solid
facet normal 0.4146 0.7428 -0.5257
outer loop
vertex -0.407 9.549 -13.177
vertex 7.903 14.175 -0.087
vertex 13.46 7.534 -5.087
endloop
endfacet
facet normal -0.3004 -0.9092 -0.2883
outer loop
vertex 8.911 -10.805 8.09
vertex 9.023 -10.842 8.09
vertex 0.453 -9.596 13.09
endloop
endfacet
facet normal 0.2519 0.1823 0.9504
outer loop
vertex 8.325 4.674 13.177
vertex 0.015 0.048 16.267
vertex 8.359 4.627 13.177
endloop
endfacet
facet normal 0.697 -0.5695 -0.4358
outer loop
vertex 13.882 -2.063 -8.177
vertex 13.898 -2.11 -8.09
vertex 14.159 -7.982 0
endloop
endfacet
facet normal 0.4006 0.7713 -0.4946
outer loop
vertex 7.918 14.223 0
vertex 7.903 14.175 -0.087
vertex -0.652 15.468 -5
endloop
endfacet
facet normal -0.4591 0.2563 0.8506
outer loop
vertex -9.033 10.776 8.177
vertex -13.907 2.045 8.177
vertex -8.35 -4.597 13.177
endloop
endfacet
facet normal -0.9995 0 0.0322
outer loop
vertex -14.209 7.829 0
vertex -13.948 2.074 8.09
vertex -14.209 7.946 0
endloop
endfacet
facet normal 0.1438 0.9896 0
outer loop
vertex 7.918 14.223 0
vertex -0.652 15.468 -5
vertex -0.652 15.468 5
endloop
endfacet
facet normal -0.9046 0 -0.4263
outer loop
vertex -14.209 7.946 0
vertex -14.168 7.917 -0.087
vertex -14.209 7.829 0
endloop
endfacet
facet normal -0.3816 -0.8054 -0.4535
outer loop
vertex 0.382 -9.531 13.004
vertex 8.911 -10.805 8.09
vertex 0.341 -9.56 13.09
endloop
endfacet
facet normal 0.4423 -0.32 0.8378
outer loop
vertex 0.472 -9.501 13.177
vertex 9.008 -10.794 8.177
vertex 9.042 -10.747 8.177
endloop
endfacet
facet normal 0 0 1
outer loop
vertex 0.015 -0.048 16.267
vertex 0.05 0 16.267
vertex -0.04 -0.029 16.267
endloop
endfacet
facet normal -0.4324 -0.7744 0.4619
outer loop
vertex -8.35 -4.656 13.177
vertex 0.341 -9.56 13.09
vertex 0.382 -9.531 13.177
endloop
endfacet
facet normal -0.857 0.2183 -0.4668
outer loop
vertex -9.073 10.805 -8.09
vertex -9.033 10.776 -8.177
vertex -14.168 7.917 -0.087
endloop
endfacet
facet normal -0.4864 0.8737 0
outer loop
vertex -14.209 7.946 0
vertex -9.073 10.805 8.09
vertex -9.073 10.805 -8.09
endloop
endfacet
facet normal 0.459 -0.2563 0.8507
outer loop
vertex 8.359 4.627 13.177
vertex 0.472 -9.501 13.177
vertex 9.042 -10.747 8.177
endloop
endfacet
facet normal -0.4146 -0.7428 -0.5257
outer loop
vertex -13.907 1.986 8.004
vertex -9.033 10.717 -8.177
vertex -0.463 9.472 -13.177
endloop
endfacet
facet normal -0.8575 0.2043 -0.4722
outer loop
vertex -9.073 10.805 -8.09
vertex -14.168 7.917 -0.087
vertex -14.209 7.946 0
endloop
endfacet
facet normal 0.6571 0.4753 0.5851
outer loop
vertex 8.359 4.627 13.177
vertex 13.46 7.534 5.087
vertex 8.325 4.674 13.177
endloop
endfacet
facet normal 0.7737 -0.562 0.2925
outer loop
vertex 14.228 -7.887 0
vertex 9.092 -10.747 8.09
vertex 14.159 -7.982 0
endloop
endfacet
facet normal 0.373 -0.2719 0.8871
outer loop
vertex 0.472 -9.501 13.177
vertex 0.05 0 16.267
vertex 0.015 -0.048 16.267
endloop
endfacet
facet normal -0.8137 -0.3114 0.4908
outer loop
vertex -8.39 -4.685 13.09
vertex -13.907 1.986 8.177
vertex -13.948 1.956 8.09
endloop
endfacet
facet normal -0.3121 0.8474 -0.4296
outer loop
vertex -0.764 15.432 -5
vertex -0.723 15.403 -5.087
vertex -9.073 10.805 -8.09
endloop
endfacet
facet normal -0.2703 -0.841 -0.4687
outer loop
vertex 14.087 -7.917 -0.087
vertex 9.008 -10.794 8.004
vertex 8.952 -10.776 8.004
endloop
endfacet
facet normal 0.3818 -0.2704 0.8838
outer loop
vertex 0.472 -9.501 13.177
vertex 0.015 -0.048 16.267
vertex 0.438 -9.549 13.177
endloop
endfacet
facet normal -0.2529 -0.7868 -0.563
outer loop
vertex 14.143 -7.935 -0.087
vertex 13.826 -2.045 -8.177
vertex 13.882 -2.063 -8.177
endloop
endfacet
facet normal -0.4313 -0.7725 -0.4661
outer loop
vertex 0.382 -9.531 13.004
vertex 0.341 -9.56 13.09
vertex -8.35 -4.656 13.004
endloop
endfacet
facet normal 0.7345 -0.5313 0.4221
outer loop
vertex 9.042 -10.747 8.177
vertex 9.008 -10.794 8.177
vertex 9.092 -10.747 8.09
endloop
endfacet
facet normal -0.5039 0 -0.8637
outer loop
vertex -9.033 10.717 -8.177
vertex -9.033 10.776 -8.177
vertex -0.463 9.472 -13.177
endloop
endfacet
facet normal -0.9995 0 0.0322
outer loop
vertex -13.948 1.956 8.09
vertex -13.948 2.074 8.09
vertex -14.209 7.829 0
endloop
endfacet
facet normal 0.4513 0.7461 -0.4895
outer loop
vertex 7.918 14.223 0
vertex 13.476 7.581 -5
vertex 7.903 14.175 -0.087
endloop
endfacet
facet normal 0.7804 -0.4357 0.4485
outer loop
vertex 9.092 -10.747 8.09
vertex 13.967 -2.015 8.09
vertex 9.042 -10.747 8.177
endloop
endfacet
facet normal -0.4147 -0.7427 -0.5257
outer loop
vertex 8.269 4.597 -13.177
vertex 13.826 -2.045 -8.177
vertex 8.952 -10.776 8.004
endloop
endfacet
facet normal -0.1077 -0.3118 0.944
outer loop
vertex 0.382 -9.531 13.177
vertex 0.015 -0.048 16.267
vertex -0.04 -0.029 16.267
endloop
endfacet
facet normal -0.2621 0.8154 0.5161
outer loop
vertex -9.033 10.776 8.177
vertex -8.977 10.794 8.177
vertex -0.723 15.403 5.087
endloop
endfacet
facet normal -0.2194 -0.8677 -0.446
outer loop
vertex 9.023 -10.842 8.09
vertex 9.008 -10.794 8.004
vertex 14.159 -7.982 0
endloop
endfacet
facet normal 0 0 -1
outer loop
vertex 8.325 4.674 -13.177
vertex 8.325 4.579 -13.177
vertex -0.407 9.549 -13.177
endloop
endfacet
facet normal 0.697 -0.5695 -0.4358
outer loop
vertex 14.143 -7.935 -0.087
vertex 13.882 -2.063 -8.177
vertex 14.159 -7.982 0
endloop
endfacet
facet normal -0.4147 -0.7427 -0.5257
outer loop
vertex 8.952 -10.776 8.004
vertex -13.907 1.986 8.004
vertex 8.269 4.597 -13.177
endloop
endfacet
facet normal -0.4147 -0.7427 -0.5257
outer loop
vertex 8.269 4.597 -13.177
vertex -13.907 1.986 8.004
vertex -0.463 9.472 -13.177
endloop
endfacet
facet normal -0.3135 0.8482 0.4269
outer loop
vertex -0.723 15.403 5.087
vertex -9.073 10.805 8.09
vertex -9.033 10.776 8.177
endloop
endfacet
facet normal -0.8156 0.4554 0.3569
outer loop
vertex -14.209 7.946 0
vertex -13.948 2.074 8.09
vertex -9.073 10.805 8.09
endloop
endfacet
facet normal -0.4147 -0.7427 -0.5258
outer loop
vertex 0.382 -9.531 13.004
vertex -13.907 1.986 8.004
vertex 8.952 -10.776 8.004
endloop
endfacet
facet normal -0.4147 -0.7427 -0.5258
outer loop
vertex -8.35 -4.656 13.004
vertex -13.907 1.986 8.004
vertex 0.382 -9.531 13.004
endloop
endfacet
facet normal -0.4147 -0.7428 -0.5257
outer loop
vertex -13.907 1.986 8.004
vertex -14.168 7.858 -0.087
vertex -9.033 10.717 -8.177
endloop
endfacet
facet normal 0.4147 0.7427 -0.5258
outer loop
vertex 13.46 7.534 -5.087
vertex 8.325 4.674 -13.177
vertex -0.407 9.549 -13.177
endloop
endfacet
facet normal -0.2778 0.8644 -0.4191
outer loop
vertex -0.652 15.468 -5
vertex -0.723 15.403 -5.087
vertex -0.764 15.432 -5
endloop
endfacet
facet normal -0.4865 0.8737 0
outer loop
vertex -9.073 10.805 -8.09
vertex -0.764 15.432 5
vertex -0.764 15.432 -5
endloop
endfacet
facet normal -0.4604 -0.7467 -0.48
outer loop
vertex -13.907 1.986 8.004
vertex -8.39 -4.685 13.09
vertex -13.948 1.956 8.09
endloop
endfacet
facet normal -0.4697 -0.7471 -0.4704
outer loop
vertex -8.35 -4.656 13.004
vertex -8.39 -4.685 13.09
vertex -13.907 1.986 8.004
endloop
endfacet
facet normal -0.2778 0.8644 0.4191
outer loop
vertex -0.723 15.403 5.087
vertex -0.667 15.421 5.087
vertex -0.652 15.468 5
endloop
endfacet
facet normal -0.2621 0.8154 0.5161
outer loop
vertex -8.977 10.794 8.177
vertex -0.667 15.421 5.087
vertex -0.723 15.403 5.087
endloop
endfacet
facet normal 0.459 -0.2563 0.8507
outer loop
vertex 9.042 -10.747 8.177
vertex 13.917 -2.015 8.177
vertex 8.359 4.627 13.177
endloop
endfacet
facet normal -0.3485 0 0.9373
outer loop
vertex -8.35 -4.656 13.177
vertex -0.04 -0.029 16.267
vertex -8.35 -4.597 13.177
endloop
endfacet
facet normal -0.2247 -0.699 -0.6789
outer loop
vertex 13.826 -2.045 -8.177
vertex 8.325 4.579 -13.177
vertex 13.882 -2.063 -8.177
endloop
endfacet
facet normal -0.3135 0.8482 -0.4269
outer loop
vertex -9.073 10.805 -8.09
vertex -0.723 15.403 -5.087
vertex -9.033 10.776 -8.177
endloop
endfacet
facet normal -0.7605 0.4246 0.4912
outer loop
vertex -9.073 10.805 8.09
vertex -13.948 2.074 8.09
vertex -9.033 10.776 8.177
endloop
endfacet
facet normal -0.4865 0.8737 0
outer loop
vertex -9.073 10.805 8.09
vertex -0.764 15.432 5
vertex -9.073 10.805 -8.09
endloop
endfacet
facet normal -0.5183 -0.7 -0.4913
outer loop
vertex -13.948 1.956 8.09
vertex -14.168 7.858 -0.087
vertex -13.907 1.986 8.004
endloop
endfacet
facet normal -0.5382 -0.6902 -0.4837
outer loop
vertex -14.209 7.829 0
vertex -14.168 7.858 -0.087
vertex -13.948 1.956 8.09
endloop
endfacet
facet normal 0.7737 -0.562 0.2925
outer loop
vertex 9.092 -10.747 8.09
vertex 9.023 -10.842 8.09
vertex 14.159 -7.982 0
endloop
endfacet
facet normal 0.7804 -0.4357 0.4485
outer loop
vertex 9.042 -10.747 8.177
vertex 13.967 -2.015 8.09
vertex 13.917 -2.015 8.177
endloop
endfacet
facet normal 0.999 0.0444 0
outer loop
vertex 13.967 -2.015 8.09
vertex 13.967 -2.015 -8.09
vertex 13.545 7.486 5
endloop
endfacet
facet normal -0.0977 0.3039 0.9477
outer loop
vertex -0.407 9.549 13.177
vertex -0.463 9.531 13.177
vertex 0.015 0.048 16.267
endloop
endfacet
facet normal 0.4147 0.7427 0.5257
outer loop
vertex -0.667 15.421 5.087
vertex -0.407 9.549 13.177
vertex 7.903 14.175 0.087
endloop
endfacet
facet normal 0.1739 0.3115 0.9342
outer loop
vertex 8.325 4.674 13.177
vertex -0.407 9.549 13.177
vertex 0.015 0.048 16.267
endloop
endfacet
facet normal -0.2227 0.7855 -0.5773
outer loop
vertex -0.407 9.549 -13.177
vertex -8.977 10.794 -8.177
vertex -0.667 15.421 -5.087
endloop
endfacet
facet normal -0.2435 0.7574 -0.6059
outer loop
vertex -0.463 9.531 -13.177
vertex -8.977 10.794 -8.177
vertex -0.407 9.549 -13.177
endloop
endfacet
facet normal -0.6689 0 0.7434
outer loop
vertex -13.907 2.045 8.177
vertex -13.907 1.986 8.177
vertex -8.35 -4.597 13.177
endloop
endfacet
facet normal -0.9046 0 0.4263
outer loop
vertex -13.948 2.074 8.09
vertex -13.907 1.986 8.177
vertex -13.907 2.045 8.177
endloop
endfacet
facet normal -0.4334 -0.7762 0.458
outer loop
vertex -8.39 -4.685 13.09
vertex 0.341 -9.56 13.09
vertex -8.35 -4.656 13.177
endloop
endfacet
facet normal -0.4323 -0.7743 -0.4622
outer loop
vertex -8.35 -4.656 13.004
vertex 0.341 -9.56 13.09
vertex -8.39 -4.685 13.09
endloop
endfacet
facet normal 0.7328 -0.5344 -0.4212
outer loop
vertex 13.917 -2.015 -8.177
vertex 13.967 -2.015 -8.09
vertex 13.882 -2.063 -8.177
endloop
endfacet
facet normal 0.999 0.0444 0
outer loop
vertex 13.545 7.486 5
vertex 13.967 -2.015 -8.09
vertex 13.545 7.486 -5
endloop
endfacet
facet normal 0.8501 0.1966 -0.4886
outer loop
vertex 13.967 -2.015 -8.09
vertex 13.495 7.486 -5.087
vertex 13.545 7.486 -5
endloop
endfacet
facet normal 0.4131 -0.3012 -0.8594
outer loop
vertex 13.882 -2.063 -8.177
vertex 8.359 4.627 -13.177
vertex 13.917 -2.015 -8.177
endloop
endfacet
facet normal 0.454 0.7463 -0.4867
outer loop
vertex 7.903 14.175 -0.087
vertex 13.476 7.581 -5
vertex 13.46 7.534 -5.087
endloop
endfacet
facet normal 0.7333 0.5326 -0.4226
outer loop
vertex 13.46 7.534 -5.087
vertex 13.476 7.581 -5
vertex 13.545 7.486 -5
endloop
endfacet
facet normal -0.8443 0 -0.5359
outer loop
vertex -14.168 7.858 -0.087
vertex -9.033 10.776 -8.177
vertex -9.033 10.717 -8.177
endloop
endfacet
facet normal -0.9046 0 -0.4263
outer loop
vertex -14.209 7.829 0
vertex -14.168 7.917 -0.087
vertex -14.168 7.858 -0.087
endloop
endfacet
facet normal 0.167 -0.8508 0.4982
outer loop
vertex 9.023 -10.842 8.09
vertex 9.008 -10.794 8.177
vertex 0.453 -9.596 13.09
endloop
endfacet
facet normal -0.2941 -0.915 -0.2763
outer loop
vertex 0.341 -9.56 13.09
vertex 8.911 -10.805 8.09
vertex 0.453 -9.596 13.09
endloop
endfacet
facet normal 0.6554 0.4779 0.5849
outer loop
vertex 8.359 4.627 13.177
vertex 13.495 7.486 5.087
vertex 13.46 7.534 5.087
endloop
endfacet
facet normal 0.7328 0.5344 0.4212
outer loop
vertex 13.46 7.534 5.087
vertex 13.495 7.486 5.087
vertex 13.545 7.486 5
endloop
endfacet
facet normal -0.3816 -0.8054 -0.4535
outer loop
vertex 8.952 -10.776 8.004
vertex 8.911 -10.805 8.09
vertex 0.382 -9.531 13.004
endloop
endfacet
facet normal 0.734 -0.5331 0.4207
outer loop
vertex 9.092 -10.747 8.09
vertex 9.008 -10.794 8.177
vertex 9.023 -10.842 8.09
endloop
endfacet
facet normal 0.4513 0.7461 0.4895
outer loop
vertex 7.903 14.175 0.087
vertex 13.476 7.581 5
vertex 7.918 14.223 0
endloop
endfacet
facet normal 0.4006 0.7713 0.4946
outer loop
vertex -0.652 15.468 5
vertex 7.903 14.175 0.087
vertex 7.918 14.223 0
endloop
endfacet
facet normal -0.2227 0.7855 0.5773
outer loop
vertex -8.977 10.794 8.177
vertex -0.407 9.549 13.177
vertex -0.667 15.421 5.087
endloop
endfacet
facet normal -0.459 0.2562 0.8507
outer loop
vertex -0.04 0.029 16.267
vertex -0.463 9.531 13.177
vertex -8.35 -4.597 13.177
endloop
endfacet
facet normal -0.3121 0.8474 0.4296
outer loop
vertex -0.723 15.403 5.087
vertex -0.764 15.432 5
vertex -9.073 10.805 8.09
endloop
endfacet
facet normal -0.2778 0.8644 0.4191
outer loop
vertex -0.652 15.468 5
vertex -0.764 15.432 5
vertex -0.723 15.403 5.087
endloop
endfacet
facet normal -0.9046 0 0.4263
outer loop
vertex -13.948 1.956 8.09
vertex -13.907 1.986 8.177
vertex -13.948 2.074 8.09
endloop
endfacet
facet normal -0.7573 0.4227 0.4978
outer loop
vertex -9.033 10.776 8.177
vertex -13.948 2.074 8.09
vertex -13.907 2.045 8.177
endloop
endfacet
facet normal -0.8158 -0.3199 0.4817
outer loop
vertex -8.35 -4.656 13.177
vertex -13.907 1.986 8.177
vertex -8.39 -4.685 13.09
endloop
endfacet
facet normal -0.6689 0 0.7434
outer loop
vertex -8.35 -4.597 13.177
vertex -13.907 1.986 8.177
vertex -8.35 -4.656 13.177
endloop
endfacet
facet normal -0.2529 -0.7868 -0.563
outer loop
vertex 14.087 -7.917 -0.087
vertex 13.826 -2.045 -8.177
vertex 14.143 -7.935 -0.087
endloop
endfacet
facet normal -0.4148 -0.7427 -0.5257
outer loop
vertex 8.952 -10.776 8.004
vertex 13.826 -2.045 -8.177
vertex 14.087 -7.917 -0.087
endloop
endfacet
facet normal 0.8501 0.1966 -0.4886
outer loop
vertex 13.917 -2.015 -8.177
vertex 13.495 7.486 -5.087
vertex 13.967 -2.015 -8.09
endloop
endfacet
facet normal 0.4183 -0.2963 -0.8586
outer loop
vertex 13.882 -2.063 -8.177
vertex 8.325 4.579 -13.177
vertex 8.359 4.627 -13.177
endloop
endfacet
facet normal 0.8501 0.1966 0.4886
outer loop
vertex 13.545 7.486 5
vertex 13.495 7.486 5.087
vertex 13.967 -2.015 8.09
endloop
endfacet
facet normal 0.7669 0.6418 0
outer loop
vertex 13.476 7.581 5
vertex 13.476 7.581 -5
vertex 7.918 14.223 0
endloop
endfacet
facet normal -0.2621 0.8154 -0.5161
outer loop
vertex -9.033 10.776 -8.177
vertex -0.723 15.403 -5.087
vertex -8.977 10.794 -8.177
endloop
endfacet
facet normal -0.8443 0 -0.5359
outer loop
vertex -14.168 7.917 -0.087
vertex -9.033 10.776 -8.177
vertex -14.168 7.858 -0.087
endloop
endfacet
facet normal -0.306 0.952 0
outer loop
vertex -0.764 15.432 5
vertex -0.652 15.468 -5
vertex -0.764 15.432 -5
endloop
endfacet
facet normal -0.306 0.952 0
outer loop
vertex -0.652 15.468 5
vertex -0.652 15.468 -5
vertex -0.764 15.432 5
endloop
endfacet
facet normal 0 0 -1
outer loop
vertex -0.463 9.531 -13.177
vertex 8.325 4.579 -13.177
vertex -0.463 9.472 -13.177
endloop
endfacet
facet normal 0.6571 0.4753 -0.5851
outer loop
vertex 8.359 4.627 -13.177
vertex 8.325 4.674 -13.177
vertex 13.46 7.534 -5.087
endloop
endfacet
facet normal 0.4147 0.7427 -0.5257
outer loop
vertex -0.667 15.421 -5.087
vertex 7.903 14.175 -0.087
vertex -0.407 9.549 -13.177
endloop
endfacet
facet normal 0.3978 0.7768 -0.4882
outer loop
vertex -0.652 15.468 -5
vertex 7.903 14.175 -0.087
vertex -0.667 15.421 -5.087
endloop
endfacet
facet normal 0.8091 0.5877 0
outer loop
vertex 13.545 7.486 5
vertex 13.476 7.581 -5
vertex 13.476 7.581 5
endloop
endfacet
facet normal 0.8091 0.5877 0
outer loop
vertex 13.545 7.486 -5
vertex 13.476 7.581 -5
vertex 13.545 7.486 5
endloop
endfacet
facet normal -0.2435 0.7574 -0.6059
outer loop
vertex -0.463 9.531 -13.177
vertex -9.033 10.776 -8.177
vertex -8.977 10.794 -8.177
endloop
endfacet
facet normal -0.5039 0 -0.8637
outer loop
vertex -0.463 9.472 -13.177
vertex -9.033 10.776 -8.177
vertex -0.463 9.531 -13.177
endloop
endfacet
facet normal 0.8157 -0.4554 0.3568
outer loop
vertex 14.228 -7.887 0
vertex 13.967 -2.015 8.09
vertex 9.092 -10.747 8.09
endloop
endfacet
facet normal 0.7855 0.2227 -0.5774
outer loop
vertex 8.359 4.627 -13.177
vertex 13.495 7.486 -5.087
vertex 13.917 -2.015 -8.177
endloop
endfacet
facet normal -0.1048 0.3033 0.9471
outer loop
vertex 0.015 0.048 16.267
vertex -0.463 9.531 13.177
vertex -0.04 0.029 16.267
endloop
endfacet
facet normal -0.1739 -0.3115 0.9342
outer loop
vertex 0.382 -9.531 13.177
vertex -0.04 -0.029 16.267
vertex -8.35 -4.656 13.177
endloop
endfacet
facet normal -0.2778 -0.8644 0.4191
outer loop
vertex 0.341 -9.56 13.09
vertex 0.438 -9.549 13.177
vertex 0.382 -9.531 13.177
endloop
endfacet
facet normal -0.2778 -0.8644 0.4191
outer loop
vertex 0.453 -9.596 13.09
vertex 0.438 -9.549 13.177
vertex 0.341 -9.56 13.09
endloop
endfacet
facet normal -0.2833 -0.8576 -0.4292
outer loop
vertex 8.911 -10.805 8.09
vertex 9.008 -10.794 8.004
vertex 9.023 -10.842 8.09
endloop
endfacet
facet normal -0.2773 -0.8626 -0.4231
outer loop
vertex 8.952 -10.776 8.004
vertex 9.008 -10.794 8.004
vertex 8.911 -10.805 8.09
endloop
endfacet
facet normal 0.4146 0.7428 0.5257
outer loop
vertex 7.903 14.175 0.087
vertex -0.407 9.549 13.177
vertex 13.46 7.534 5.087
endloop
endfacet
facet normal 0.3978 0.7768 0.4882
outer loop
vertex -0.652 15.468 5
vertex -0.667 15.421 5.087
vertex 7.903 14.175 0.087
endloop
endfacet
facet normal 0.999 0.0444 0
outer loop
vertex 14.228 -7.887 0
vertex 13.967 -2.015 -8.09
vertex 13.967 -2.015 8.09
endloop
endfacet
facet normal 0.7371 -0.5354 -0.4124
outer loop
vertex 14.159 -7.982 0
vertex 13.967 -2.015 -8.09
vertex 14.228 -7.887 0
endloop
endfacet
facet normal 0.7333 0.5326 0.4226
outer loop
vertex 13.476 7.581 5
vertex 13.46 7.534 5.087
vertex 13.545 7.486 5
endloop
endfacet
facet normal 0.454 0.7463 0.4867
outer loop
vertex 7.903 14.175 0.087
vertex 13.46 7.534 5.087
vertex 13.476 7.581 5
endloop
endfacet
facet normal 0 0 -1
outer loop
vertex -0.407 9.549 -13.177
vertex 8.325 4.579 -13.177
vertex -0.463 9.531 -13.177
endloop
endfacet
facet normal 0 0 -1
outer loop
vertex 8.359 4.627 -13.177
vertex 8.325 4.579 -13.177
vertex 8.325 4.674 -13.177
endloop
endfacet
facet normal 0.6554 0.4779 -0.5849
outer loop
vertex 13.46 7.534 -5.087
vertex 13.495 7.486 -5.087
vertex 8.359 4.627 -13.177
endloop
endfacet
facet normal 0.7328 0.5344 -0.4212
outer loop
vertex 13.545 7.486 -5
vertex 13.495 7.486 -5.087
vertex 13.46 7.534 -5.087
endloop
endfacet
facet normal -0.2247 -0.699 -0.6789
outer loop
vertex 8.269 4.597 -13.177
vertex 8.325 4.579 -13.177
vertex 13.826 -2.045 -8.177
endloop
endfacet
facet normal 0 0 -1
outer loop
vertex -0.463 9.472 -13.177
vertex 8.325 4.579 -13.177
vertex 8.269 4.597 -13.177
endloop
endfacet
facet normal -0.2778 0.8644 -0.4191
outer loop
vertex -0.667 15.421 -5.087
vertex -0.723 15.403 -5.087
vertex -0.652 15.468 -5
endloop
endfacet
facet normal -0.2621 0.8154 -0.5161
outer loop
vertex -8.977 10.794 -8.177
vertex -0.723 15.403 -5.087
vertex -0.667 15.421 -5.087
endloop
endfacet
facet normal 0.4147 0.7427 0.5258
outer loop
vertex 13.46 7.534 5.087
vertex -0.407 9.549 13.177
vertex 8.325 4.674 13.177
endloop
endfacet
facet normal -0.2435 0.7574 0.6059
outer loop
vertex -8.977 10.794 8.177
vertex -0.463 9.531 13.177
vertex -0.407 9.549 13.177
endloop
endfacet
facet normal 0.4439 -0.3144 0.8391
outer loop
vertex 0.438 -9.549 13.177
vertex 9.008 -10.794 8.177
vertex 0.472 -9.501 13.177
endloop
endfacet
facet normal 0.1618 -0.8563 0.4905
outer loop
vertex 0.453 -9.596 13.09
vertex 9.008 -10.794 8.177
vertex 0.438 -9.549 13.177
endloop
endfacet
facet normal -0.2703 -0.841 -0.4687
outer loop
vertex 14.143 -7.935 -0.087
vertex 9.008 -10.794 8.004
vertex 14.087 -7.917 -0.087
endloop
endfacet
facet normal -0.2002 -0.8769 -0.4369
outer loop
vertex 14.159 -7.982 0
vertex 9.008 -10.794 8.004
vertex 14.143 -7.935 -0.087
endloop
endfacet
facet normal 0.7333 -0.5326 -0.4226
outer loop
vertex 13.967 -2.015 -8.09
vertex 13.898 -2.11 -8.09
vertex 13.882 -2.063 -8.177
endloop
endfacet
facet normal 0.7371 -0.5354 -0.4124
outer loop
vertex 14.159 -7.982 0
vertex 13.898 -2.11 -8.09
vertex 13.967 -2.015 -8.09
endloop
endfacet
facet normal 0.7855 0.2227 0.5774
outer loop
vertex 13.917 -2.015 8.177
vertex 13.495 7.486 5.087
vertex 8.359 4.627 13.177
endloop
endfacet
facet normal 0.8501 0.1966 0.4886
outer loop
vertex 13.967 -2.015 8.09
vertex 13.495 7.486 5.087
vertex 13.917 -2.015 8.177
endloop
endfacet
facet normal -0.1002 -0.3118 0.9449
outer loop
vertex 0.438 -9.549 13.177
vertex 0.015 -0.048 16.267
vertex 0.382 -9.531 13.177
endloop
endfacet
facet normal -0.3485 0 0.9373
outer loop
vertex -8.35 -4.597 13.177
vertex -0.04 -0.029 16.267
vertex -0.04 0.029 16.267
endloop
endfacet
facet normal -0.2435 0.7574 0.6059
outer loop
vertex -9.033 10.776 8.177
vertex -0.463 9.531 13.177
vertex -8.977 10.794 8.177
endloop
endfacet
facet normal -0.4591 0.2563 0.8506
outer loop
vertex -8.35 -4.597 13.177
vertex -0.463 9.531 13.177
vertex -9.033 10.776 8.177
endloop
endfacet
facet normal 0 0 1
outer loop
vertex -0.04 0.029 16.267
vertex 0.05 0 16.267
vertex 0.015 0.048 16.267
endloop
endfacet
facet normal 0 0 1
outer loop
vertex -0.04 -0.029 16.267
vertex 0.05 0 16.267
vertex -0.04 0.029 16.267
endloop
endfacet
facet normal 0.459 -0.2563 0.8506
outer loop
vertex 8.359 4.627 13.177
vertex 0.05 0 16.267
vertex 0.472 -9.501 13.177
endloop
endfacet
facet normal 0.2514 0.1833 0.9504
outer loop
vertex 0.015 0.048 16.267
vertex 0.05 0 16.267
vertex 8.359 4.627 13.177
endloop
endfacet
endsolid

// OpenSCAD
// Auto-generated OpenSCAD file

    inner_points = 10*[[1.4127776500989453, -0.7887289142226223, 3.3946051633490118e-15], [-1.4127776500989453, 0.7887289142226223, -3.3946051633490118e-15], [7.699325831418754e-14, 1.448747966845947e-13, 1.618033988749895], [0.7887289142226223, 1.4127776500989453, -1.6402787932550622e-13], [1.3866917666528789, -0.20152279240725185, 0.8090169943748995], [1.386691766652802, -0.2015227924073968, -0.8090169943749954], [0.899230489753498, -1.0746673987146065, 0.809016994375001], [-0.8992304897534211, 1.0746673987147513, 0.8090169943748939], [-0.899230489753498, 1.0746673987146065, -0.809016994375001], [-1.386691766652802, 0.2015227924073968, 0.8090169943749954], [1.3444839206104982, 0.7485966710918835, 0.499999999999869], [1.3444839206104504, 0.7485966710917942, -0.500000000000131], [-0.06829372948844725, 1.5373255853145058, 0.49999999999986555], [-0.06829372948849499, 1.5373255853144165, -0.5000000000001343], [0.8309367602650506, 0.46265818659989943, 1.3090169943748666], [0.8309367602649261, 0.46265818659966507, -1.3090169943750283], [0.04220784604242839, -0.950119463499046, 1.3090169943750305], [-0.042207846042303876, 0.9501194634992803, 1.3090169943748644], [-0.04220784604242839, 0.950119463499046, -1.3090169943750305], [-0.8309367602649261, -0.46265818659966507, 1.3090169943750283]];

    outer_points = 10*[[1.51730962461505, 0.0, -0.5619657389916497], [-1.51730962461505, 0.0, 0.5619657389916497], [0.5173908766017687, 0.6315464316752465, 1.3969573272642983], [-0.2193448714004602, 1.4896922814420965, -0.592231983898246], [1.4184434174514022, 0.7761134471924181, 0.0608290828944803], [0.9010525408496336, 0.14456701551717166, -1.3361282443698181], [1.5540060032348615, -0.14456701551717166, 0.42684857816837674], [-1.0366151266330927, 0.7761134471924181, 0.9701087490959216], [-1.5540060032348615, 0.14456701551717166, -0.42684857816837674], [-0.9010525408496336, -0.14456701551717166, 1.3361282443698181], [0.7410836573200632, 1.4003449522003508, -0.3284250545406229], [0.4213185101110674, 1.0100277919513354, -1.1917921636231694], [-0.7762259672949867, 1.4003449522003508, 0.2335406844510268], [-1.0959911145039825, 1.0100277919513354, -0.6298264246315197], [0.7777800359398745, 1.2557779366831792, 0.6603892626194036], [-0.05937598787088977, 0.23391434475891726, -1.5999351737274412], [0.9971249073403348, -0.23391434475891726, 1.2526212465176494], [-0.15996888352957034, 1.2557779366831792, 1.0077031898291953], [-0.9971249073403348, 0.23391434475891726, -1.2526212465176494], [0.05937598787088977, -0.23391434475891726, 1.5999351737274412]];

    // Convex hull for inner set (I)
    module inner_hull() {
        hull() {
            for (p = inner_points) {
                translate(p) sphere(r=0.1);
            }
        }
    }

    // Convex hull for outer set (O) minus inner hull (O \ I)
    module outer_minus_inner() {
        difference() {
            hull() {
                for (p = outer_points) {
                    translate(p) sphere(r=0.1);
                }
            }
            inner_hull(); // Subtract inner hull
        }
    }

    // Convex hull for outer set (O) minus all translated inner hulls
    module outer_minus_AllTranslationInner() {
        difference() {
            hull() {
                for (p = outer_points) {
                    translate(p) sphere(r=0.1);
                }
            }
            hull() {
                translate([0,0,50]) inner_hull();
                translate([0,0,-50]) inner_hull();
            }; // Subtract translated inner hulls
        }
    }

    // Difference between outer_minus_inner and outer_minus_AllTranslationInner
    module outer_minus_inner_diff() {
        difference() {
            // Outer minus inner
            difference() {
                hull() {
                    for (p = outer_points) {
                        translate(p) sphere(r=0.1);
                    }
                }
                inner_hull();
            }

            // Subtract Outer minus AllTranslationInner
            difference() {
                hull() {
                    for (p = outer_points) {
                        translate(p) sphere(r=0.1);
                    }
                }
                hull() {
                    translate([0,0,50]) inner_hull();
                    translate([0,0,-50]) inner_hull();
                };
            }
        }
    }

    // Rendering all with colors applied
    color([1, 0, 0, 0.5]) inner_hull(); // Transparent red
    
